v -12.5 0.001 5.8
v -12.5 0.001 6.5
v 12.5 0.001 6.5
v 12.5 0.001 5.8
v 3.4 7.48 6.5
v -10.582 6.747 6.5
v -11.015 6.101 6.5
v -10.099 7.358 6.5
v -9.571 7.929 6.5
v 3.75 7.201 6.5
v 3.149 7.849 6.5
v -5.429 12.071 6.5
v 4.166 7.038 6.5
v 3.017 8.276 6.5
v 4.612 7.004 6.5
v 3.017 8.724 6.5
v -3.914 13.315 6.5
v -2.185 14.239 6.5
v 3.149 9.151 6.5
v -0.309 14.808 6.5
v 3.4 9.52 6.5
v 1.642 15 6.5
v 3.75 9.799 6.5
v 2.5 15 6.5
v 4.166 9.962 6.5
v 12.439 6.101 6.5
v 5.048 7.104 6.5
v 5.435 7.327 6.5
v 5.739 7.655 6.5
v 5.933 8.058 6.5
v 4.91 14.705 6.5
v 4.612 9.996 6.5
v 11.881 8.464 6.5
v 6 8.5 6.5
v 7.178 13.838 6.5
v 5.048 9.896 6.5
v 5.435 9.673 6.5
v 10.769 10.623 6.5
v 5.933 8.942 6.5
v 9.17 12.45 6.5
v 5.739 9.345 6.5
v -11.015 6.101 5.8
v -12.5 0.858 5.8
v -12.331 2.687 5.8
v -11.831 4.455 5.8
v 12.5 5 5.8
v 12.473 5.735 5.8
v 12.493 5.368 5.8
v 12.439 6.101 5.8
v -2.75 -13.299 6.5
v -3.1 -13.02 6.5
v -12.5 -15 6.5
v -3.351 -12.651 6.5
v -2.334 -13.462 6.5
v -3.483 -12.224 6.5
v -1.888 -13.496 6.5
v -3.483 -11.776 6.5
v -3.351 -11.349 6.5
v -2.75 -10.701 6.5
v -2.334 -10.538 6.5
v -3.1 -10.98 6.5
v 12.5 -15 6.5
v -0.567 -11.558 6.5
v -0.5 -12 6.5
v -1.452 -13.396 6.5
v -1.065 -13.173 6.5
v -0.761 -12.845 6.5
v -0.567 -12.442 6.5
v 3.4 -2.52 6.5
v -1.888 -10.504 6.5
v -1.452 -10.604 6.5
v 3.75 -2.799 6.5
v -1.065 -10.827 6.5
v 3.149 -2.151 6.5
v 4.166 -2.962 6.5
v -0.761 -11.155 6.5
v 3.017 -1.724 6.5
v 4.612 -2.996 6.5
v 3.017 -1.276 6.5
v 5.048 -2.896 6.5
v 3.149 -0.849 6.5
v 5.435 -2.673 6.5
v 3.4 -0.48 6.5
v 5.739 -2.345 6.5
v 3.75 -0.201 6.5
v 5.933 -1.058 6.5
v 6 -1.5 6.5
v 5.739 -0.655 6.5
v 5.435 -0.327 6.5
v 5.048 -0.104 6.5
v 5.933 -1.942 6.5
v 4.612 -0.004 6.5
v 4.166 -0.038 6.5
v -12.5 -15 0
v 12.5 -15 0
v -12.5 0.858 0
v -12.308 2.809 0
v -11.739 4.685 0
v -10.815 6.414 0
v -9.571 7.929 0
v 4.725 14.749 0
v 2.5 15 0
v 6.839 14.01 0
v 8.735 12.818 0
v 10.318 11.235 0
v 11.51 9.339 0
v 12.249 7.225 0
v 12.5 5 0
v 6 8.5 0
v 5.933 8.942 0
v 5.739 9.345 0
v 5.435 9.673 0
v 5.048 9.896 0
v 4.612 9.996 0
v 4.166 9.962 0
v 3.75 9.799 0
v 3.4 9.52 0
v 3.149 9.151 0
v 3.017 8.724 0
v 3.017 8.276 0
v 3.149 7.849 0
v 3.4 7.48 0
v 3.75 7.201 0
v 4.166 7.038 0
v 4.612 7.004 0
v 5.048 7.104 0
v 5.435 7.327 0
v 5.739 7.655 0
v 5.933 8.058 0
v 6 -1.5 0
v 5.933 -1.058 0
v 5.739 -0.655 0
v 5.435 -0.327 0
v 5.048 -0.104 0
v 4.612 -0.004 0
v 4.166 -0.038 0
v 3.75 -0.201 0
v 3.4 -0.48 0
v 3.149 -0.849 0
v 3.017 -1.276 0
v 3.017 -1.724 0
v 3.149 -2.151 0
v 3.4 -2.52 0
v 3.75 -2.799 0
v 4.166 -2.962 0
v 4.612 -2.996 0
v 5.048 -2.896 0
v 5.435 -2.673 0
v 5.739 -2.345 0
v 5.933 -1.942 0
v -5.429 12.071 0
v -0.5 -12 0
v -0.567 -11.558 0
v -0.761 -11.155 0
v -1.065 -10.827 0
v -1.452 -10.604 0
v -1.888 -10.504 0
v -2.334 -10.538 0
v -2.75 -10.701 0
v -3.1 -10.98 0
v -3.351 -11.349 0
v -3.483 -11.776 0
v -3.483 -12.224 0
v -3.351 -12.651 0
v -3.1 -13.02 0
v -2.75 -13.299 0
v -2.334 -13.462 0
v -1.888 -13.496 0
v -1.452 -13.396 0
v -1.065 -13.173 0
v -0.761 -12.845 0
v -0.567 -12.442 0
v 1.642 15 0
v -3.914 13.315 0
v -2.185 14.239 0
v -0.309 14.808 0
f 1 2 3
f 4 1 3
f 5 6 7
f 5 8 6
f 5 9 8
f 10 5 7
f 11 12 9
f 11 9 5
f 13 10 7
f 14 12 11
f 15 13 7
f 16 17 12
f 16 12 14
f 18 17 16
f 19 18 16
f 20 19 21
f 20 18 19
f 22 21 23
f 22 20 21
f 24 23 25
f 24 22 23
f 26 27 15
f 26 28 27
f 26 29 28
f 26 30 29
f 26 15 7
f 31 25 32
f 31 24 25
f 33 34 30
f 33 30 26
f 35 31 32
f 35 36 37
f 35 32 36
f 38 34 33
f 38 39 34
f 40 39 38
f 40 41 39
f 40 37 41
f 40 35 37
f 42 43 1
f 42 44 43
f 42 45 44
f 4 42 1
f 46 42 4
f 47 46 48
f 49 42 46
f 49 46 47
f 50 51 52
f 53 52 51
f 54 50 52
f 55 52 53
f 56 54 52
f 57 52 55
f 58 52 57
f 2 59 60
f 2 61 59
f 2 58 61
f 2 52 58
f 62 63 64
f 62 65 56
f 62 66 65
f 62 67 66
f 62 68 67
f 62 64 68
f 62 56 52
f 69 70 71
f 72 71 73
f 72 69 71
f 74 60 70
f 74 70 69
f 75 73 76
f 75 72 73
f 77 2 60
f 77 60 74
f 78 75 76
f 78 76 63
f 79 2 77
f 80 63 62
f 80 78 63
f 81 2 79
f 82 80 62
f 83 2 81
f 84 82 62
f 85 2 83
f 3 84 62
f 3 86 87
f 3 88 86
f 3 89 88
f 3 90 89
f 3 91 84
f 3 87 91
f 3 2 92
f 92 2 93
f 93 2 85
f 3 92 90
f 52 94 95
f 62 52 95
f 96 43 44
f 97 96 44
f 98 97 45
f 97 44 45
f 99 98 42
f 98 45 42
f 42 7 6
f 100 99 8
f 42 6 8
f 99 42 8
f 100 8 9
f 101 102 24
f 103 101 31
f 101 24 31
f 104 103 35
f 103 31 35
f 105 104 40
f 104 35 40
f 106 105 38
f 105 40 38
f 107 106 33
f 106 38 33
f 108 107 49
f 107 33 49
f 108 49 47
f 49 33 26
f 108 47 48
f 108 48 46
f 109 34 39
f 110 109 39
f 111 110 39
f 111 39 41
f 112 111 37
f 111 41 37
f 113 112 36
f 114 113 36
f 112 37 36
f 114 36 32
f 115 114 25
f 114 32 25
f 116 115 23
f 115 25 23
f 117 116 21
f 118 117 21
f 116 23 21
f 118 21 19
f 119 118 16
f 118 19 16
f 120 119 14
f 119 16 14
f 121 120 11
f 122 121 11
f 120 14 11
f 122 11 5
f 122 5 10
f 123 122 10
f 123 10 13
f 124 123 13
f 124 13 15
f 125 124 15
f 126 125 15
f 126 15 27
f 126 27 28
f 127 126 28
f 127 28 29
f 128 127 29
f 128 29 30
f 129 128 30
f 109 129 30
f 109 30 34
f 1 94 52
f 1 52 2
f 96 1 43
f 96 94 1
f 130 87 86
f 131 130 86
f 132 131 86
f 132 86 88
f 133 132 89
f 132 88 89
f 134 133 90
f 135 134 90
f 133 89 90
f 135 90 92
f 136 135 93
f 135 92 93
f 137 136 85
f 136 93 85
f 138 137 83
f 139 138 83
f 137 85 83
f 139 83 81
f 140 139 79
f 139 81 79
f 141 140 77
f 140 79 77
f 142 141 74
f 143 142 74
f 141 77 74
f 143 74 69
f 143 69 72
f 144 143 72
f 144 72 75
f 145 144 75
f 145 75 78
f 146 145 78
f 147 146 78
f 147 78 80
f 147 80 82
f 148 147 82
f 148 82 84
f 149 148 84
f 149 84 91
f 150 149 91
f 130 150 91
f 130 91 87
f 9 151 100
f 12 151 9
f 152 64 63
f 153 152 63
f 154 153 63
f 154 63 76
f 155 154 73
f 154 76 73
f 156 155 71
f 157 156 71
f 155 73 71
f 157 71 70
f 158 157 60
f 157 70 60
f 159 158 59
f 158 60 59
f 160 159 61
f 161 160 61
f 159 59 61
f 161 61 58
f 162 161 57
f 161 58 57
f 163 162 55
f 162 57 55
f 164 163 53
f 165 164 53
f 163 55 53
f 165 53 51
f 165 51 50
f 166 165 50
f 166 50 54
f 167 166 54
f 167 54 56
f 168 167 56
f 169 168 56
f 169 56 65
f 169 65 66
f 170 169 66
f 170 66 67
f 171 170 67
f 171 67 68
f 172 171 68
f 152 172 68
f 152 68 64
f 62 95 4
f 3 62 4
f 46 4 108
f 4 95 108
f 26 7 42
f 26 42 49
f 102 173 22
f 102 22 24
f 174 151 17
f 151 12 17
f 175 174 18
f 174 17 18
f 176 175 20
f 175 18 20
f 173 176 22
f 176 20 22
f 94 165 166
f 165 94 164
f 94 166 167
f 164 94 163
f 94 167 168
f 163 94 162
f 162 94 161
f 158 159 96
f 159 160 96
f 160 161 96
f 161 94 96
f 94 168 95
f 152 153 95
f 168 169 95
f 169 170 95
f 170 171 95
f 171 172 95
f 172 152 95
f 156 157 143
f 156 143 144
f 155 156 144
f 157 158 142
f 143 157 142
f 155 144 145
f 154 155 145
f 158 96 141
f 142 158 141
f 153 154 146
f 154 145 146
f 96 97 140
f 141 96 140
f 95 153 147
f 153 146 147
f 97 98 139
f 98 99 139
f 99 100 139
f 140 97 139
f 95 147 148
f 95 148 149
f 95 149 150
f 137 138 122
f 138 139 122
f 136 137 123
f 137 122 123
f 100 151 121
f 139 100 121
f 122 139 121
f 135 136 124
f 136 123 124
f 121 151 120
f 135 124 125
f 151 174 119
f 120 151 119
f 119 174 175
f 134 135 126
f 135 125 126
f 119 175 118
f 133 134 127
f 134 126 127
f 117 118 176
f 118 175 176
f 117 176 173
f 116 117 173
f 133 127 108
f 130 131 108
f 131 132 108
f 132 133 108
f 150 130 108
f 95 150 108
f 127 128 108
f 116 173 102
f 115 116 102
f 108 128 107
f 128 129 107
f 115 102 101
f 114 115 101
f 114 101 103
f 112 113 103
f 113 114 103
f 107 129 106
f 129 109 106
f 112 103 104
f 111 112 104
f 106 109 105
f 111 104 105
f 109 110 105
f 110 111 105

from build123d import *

# Parameters (mm, degrees)
F0_W     = 25
F0_H     = 30
F1_DEPTH = 6.5
F2_R     = 1.5
F3_DEPTH = 6.501
F4_W     = 25
F4_H     = 6.1
F5_DEPTH = 0.7
F6_SIZE  = 10
F7_R     = 10


with BuildPart() as f1:
    # F0 (on Top) → F1 (new body)
    with BuildSketch(Plane.XY):
        Rectangle(F0_W, F0_H)
    extrude(amount=F1_DEPTH)

    # F2 (on face) → F3 (cut, through all)
    with BuildSketch(Plane.XY.offset(6.5)):
        with Locations((-2, -12)):
            Circle(F2_R)
        with Locations((4.5, -1.5)):
            Circle(F2_R)
        with Locations((4.5, 8.5)):
            Circle(F2_R)
    extrude(amount=-F3_DEPTH, mode=Mode.SUBTRACT)

    # F4 (on face) → F5 (cut)
    with BuildSketch(Plane.XY.offset(6.5)):
        with Locations((0, 3.051)):
            Rectangle(F4_W, F4_H)
    extrude(amount=-F5_DEPTH, mode=Mode.SUBTRACT)

    # F6
    f6_edges = [f1.edges().sort_by_distance(p)[0] for p in [
        (-12.5, 15, 3.25),
    ]]
    chamfer(f6_edges, length=F6_SIZE)

    # F7
    f7_edges = [f1.edges().sort_by_distance(p)[0] for p in [
        (-2.5, 15, 3.25),
        (-12.5, 5, 2.9),
        (12.5, 15, 3.25),
    ]]
    fillet(f7_edges, radius=F7_R)


solid = f1.part
